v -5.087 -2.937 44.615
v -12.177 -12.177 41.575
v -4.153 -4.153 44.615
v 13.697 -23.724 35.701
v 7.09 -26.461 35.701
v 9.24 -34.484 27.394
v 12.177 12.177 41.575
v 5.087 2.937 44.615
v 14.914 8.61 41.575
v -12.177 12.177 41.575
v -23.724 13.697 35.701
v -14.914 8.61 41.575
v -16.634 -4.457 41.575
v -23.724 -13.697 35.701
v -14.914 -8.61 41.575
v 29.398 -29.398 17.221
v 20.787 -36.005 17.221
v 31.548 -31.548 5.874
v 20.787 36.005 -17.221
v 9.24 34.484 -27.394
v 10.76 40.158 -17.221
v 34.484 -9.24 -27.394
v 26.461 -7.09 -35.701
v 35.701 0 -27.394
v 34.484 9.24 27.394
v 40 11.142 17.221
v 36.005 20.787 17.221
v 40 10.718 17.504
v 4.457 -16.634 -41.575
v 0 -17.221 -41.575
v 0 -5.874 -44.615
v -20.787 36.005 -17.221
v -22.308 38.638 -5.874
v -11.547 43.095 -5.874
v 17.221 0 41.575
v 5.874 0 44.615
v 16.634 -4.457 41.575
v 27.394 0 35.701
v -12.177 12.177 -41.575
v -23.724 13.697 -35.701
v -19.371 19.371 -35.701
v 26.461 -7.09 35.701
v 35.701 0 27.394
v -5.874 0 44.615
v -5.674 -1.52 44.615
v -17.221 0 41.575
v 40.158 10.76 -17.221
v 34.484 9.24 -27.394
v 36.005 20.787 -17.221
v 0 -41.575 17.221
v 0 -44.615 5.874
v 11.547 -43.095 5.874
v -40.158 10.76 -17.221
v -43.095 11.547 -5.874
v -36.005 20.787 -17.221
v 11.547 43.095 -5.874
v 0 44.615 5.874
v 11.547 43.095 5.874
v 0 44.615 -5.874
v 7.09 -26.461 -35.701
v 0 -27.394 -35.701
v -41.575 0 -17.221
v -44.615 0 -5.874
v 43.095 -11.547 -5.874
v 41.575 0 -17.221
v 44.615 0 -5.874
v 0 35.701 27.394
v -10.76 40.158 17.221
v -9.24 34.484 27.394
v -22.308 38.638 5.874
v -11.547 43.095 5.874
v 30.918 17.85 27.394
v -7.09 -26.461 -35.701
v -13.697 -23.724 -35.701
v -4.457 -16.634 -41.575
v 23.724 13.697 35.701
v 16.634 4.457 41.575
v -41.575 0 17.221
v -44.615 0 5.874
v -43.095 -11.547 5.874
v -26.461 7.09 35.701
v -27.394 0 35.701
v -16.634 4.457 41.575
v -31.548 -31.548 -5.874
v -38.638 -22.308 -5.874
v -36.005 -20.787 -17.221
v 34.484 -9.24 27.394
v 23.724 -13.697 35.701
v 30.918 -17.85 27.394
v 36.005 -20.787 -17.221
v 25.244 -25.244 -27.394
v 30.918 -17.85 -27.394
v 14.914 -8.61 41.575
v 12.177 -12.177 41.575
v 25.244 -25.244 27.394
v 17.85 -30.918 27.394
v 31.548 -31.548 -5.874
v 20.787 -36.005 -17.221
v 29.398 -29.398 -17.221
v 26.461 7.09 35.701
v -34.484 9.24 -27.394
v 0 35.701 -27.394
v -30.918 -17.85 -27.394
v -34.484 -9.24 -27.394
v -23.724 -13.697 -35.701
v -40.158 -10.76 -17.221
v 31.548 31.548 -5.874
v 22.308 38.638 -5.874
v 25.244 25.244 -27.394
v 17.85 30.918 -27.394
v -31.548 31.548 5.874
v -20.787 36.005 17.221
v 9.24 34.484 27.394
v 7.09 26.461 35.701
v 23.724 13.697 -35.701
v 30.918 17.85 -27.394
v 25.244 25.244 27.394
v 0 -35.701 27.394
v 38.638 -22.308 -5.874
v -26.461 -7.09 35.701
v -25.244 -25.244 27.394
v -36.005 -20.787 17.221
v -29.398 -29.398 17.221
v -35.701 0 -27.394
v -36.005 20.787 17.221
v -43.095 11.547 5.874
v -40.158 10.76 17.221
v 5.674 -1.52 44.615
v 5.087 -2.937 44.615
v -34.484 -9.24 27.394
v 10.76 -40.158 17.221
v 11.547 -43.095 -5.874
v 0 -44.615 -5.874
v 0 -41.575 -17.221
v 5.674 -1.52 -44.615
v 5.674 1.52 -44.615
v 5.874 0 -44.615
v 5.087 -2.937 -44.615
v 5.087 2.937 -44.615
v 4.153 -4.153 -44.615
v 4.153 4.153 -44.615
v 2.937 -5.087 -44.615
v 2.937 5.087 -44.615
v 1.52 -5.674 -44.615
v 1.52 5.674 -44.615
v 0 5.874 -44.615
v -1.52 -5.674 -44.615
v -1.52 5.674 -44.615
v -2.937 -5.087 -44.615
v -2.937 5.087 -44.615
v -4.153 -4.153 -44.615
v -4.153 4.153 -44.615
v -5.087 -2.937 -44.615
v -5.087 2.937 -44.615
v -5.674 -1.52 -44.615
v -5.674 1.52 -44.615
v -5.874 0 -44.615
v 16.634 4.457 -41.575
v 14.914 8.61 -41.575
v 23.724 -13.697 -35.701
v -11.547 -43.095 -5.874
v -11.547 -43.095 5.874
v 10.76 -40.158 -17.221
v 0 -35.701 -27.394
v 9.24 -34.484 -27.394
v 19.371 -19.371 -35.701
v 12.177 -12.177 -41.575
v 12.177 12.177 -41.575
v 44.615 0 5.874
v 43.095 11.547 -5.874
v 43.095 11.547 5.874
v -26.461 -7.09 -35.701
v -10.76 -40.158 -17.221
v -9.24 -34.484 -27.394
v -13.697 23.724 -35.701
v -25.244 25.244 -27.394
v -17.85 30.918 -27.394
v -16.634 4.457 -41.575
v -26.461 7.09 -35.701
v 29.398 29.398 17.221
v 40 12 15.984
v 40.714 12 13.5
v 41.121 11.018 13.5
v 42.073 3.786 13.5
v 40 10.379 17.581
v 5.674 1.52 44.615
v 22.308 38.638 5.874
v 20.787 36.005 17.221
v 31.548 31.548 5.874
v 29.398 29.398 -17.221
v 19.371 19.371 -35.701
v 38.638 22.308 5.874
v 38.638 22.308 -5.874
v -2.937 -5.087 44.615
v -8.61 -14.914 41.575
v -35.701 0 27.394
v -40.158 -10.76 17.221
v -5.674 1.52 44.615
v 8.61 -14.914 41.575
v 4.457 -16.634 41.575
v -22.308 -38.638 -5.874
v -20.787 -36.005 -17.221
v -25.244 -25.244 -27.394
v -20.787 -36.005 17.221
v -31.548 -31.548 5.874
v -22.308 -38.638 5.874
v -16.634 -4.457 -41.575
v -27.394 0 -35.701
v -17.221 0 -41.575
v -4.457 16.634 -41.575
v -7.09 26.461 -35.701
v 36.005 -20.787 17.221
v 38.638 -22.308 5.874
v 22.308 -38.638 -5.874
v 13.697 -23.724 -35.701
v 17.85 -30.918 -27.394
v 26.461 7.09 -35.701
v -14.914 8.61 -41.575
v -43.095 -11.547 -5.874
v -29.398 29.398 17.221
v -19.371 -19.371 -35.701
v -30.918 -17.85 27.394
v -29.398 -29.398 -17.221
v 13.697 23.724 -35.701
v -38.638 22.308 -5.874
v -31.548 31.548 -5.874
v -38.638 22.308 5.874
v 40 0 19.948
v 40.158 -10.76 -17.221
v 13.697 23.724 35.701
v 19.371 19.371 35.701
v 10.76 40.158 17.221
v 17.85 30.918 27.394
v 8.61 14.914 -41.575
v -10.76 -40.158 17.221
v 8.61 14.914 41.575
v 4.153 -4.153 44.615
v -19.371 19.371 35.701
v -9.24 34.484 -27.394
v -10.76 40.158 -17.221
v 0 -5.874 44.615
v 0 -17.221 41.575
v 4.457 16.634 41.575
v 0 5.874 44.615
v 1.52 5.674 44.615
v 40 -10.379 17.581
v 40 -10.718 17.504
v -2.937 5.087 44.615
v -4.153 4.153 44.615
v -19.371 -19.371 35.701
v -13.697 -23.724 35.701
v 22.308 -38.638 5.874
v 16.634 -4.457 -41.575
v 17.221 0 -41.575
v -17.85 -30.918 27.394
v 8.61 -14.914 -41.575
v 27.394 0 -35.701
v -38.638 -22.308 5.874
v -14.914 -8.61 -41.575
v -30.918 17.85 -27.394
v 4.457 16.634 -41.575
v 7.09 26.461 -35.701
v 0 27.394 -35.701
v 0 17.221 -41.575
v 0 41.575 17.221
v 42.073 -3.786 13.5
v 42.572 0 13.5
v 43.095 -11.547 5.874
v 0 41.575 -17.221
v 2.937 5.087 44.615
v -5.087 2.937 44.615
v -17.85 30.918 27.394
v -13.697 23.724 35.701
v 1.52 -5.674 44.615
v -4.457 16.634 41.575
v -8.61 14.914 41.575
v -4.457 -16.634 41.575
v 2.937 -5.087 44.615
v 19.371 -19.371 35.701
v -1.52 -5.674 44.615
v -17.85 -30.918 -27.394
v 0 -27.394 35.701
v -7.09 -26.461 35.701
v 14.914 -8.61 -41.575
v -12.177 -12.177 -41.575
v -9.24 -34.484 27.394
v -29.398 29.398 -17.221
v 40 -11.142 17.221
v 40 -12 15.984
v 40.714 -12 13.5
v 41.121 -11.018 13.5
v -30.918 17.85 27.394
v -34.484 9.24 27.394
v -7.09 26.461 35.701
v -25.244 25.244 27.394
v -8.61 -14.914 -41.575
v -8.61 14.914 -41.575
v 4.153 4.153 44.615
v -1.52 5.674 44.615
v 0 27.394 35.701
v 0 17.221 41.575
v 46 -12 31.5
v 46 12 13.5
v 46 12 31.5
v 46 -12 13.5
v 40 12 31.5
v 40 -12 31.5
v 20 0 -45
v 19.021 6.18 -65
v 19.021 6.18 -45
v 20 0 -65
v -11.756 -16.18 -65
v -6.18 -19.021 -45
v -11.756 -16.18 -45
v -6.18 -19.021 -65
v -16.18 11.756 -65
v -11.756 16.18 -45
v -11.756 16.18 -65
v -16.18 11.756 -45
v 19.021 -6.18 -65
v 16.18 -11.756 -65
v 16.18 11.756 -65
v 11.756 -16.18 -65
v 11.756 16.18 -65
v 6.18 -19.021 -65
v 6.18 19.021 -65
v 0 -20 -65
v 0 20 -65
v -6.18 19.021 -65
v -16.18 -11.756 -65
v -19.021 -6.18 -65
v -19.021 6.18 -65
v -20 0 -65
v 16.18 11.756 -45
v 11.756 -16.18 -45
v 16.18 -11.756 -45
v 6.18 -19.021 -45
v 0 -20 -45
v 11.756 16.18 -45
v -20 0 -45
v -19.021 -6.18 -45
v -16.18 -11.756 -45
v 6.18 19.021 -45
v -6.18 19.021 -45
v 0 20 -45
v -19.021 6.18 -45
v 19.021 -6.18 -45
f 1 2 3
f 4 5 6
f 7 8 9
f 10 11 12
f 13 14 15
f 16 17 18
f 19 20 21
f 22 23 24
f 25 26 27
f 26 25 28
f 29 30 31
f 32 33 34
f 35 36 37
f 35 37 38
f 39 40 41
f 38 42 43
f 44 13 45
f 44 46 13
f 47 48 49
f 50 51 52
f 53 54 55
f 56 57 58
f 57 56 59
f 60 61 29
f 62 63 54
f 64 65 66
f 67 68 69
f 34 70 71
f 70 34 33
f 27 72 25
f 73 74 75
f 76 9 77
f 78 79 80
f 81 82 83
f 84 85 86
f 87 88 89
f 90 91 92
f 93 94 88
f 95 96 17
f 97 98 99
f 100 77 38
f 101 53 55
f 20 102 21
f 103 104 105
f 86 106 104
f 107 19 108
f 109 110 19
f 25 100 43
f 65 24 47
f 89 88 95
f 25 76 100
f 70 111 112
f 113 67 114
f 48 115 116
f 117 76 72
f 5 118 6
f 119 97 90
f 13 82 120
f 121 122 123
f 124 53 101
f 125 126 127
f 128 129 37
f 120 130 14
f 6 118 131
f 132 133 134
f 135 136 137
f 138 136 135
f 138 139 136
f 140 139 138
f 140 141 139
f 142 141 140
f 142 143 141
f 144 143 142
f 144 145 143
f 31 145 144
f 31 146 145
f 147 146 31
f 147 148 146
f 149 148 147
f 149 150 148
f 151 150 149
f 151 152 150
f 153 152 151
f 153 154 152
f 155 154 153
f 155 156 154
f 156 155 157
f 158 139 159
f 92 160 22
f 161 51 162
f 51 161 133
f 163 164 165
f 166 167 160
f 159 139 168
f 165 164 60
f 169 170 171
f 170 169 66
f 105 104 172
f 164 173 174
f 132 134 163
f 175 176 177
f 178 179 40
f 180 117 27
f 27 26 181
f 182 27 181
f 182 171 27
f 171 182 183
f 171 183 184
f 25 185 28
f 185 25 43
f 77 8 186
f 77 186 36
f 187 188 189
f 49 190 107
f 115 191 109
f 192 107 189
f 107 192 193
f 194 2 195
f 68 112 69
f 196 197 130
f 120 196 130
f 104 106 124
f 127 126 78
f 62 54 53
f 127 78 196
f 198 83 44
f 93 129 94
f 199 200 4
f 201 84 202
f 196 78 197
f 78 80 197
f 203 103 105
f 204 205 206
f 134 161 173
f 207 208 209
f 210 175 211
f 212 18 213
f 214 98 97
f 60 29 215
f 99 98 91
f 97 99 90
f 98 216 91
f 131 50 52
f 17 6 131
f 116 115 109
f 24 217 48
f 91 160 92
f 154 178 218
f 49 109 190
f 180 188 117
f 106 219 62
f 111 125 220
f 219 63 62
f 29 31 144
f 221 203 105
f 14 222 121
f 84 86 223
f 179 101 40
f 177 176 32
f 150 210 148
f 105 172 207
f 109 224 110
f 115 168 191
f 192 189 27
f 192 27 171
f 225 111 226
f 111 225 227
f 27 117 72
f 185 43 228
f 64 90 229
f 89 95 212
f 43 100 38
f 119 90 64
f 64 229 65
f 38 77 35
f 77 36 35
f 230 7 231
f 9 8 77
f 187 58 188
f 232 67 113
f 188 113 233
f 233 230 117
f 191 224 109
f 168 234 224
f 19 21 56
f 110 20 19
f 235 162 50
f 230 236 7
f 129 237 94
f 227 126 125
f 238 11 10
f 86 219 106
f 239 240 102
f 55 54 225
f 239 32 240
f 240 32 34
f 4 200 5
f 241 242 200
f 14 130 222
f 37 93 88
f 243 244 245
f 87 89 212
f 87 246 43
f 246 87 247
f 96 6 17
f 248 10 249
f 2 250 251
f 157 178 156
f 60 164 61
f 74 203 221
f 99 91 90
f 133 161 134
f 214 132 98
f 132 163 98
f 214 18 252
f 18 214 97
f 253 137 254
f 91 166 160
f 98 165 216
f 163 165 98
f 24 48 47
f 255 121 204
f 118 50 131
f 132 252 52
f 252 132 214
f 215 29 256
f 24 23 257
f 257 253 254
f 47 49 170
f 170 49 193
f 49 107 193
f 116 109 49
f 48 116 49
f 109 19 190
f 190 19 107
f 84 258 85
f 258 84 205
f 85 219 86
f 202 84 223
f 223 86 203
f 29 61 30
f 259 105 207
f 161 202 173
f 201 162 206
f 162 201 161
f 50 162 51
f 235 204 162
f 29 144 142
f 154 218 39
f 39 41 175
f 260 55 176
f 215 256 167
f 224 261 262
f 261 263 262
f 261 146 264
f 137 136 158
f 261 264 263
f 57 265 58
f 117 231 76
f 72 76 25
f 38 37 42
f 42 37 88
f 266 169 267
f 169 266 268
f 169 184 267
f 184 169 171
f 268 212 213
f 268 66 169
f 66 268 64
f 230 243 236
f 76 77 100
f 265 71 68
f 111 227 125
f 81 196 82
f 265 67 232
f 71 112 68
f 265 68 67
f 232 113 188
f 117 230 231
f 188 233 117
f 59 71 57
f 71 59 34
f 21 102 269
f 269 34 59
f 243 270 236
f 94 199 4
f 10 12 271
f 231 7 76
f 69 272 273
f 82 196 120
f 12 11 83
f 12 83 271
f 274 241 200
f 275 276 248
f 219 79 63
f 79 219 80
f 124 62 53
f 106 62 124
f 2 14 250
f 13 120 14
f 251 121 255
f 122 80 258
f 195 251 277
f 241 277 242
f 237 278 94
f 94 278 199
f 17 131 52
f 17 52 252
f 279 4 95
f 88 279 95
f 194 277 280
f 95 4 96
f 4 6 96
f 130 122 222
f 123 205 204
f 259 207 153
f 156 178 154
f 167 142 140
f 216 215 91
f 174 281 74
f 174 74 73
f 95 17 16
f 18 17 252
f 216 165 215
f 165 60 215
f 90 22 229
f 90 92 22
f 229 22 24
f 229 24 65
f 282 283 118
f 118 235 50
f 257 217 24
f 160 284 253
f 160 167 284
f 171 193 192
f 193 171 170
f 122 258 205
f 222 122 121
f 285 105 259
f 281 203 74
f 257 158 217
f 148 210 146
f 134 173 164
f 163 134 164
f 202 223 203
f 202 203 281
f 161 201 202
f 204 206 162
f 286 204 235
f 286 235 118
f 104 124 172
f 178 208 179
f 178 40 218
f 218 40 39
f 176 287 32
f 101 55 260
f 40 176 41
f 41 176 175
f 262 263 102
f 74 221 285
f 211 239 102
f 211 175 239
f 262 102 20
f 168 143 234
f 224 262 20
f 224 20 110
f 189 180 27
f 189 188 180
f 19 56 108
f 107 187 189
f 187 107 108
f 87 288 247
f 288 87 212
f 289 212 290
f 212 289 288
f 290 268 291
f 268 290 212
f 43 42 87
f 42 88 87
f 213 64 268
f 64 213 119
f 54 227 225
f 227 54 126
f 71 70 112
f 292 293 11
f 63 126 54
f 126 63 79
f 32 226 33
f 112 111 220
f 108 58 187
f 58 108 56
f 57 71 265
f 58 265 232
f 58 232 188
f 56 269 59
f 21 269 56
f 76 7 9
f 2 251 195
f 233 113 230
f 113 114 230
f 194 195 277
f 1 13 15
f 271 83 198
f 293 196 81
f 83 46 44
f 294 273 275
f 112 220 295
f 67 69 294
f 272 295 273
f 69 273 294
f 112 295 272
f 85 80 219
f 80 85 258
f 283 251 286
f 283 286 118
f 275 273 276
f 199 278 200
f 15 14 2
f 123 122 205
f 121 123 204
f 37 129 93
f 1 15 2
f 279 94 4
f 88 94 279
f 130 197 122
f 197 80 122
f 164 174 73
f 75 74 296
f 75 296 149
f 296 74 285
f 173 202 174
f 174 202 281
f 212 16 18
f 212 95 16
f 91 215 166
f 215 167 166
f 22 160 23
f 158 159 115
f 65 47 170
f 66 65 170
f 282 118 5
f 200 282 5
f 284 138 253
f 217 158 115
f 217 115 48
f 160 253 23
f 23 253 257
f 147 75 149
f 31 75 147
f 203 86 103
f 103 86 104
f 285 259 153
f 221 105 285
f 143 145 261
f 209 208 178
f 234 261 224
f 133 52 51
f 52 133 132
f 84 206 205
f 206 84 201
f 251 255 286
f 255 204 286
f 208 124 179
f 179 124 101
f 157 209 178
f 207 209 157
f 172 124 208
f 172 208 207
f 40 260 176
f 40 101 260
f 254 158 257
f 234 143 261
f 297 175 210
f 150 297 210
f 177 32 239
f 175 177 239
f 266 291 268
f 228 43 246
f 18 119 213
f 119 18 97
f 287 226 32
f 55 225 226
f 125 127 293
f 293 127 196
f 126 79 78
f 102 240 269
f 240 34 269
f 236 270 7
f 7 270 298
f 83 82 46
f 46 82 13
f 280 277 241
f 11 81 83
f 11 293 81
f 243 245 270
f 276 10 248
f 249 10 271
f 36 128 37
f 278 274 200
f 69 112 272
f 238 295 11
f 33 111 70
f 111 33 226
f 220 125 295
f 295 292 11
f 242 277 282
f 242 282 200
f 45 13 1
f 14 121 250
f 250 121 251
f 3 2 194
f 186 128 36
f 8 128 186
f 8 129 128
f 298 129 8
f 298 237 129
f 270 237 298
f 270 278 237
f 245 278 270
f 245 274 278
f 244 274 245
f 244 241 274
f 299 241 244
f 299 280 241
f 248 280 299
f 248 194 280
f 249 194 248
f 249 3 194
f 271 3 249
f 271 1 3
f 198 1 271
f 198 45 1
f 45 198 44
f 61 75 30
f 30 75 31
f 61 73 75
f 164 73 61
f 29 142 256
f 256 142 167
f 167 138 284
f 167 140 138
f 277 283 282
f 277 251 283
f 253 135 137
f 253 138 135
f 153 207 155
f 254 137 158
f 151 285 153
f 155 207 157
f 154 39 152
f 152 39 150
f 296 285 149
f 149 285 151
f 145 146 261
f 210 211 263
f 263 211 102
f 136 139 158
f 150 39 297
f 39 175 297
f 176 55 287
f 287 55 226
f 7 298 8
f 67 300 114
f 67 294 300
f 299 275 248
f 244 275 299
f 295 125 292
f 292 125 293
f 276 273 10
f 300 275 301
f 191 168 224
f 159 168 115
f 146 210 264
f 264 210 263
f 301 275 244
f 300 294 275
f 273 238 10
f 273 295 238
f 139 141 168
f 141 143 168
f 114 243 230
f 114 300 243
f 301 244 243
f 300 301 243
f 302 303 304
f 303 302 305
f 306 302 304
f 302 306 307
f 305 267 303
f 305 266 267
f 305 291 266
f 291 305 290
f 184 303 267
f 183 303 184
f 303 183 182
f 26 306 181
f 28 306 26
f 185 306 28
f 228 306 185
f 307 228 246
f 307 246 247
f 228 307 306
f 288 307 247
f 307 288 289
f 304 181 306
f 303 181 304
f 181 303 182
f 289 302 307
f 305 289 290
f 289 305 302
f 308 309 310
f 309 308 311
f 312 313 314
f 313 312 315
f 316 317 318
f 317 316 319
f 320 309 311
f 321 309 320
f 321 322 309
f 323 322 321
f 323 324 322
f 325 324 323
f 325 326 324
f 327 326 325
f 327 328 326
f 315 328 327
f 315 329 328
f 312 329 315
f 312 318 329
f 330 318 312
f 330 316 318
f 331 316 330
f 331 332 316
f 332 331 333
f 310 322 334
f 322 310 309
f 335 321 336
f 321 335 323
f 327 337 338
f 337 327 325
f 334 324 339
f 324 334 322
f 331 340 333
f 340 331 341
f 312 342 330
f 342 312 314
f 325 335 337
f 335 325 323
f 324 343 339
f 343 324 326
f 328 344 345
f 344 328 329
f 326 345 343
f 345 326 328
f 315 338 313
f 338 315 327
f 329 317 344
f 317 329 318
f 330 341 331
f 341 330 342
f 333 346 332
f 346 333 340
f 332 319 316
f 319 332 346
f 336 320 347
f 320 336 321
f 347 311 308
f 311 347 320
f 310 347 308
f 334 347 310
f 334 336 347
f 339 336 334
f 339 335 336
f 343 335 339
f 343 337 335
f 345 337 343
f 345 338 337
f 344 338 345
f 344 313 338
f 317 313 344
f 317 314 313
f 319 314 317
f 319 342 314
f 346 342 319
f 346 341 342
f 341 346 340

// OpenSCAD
// file: ori_params.scad
// ori_params.scad — Ori Robot Dog master parameters (mirrors Parameters/master_parameters.py)
//
// NOTE: These OpenSCAD files are a parametric, human/AI-READABLE summary of Ori.
// The authoritative, higher-fidelity manufactured geometry is the STEP files in the
// CAD_STEP/ folder of this package (NOT here, but still present). Use those for printing.
//
// All dims in millimetres. These are representative values for a readable/viewable model;
// the Python/CadQuery source (Source/) and STEP exports are the source of truth.

// Robot scale
overall_height = 364;
hip_height     = 300;
ground_clear   = 190;

// Stance
stance_length  = 437;
stance_width   = 168;

// Legs (upper = lower = 175)
link_len = 175;
link_w   = 34;
link_t   = 24;
foot_h   = 40;

// Torso (split at x=0 into two halves)
torso_len = 320;
torso_w   = 150;
torso_h   = 110;

// Head
head_d   = 90;

// Arm (6-DOF), mounted front +X
arm_base_x = 140;
arm_yaw_h  = 30;
arm_upper  = 70;
arm_fore   = 60;
arm_wrist  = 28;
grip_r     = 17;   // coupler radius
finger_len = 30;

// Servo (Hiwonder HTD-45H) envelope
servo_l = 51.1;
servo_w = 20.14;
servo_h = 40;

// Bearing (626ZZ)
bearing_od = 19;
bearing_id = 6;
bearing_w  = 6;
// main file
// ori_head.scad — 2-DOF pan/pitch dome head with camera + neck.
// Mirrors CAD/Head/head.py. Readable summary, not the manufactured part.
include <ori_params.scad>

module head() {
  color("lightblue") sphere(r=head_d/2, $fn=24);
  // camera (forward +X face)
  translate([head_d/2-2,0,head_d/4]) color("black") cube([6,24,18], center=true);
  // neck (inserts into torso)
  translate([0,0,-head_d/2-10]) color("gray") cylinder(r=20,h=20,center=true,$fn=20);
}

head();
